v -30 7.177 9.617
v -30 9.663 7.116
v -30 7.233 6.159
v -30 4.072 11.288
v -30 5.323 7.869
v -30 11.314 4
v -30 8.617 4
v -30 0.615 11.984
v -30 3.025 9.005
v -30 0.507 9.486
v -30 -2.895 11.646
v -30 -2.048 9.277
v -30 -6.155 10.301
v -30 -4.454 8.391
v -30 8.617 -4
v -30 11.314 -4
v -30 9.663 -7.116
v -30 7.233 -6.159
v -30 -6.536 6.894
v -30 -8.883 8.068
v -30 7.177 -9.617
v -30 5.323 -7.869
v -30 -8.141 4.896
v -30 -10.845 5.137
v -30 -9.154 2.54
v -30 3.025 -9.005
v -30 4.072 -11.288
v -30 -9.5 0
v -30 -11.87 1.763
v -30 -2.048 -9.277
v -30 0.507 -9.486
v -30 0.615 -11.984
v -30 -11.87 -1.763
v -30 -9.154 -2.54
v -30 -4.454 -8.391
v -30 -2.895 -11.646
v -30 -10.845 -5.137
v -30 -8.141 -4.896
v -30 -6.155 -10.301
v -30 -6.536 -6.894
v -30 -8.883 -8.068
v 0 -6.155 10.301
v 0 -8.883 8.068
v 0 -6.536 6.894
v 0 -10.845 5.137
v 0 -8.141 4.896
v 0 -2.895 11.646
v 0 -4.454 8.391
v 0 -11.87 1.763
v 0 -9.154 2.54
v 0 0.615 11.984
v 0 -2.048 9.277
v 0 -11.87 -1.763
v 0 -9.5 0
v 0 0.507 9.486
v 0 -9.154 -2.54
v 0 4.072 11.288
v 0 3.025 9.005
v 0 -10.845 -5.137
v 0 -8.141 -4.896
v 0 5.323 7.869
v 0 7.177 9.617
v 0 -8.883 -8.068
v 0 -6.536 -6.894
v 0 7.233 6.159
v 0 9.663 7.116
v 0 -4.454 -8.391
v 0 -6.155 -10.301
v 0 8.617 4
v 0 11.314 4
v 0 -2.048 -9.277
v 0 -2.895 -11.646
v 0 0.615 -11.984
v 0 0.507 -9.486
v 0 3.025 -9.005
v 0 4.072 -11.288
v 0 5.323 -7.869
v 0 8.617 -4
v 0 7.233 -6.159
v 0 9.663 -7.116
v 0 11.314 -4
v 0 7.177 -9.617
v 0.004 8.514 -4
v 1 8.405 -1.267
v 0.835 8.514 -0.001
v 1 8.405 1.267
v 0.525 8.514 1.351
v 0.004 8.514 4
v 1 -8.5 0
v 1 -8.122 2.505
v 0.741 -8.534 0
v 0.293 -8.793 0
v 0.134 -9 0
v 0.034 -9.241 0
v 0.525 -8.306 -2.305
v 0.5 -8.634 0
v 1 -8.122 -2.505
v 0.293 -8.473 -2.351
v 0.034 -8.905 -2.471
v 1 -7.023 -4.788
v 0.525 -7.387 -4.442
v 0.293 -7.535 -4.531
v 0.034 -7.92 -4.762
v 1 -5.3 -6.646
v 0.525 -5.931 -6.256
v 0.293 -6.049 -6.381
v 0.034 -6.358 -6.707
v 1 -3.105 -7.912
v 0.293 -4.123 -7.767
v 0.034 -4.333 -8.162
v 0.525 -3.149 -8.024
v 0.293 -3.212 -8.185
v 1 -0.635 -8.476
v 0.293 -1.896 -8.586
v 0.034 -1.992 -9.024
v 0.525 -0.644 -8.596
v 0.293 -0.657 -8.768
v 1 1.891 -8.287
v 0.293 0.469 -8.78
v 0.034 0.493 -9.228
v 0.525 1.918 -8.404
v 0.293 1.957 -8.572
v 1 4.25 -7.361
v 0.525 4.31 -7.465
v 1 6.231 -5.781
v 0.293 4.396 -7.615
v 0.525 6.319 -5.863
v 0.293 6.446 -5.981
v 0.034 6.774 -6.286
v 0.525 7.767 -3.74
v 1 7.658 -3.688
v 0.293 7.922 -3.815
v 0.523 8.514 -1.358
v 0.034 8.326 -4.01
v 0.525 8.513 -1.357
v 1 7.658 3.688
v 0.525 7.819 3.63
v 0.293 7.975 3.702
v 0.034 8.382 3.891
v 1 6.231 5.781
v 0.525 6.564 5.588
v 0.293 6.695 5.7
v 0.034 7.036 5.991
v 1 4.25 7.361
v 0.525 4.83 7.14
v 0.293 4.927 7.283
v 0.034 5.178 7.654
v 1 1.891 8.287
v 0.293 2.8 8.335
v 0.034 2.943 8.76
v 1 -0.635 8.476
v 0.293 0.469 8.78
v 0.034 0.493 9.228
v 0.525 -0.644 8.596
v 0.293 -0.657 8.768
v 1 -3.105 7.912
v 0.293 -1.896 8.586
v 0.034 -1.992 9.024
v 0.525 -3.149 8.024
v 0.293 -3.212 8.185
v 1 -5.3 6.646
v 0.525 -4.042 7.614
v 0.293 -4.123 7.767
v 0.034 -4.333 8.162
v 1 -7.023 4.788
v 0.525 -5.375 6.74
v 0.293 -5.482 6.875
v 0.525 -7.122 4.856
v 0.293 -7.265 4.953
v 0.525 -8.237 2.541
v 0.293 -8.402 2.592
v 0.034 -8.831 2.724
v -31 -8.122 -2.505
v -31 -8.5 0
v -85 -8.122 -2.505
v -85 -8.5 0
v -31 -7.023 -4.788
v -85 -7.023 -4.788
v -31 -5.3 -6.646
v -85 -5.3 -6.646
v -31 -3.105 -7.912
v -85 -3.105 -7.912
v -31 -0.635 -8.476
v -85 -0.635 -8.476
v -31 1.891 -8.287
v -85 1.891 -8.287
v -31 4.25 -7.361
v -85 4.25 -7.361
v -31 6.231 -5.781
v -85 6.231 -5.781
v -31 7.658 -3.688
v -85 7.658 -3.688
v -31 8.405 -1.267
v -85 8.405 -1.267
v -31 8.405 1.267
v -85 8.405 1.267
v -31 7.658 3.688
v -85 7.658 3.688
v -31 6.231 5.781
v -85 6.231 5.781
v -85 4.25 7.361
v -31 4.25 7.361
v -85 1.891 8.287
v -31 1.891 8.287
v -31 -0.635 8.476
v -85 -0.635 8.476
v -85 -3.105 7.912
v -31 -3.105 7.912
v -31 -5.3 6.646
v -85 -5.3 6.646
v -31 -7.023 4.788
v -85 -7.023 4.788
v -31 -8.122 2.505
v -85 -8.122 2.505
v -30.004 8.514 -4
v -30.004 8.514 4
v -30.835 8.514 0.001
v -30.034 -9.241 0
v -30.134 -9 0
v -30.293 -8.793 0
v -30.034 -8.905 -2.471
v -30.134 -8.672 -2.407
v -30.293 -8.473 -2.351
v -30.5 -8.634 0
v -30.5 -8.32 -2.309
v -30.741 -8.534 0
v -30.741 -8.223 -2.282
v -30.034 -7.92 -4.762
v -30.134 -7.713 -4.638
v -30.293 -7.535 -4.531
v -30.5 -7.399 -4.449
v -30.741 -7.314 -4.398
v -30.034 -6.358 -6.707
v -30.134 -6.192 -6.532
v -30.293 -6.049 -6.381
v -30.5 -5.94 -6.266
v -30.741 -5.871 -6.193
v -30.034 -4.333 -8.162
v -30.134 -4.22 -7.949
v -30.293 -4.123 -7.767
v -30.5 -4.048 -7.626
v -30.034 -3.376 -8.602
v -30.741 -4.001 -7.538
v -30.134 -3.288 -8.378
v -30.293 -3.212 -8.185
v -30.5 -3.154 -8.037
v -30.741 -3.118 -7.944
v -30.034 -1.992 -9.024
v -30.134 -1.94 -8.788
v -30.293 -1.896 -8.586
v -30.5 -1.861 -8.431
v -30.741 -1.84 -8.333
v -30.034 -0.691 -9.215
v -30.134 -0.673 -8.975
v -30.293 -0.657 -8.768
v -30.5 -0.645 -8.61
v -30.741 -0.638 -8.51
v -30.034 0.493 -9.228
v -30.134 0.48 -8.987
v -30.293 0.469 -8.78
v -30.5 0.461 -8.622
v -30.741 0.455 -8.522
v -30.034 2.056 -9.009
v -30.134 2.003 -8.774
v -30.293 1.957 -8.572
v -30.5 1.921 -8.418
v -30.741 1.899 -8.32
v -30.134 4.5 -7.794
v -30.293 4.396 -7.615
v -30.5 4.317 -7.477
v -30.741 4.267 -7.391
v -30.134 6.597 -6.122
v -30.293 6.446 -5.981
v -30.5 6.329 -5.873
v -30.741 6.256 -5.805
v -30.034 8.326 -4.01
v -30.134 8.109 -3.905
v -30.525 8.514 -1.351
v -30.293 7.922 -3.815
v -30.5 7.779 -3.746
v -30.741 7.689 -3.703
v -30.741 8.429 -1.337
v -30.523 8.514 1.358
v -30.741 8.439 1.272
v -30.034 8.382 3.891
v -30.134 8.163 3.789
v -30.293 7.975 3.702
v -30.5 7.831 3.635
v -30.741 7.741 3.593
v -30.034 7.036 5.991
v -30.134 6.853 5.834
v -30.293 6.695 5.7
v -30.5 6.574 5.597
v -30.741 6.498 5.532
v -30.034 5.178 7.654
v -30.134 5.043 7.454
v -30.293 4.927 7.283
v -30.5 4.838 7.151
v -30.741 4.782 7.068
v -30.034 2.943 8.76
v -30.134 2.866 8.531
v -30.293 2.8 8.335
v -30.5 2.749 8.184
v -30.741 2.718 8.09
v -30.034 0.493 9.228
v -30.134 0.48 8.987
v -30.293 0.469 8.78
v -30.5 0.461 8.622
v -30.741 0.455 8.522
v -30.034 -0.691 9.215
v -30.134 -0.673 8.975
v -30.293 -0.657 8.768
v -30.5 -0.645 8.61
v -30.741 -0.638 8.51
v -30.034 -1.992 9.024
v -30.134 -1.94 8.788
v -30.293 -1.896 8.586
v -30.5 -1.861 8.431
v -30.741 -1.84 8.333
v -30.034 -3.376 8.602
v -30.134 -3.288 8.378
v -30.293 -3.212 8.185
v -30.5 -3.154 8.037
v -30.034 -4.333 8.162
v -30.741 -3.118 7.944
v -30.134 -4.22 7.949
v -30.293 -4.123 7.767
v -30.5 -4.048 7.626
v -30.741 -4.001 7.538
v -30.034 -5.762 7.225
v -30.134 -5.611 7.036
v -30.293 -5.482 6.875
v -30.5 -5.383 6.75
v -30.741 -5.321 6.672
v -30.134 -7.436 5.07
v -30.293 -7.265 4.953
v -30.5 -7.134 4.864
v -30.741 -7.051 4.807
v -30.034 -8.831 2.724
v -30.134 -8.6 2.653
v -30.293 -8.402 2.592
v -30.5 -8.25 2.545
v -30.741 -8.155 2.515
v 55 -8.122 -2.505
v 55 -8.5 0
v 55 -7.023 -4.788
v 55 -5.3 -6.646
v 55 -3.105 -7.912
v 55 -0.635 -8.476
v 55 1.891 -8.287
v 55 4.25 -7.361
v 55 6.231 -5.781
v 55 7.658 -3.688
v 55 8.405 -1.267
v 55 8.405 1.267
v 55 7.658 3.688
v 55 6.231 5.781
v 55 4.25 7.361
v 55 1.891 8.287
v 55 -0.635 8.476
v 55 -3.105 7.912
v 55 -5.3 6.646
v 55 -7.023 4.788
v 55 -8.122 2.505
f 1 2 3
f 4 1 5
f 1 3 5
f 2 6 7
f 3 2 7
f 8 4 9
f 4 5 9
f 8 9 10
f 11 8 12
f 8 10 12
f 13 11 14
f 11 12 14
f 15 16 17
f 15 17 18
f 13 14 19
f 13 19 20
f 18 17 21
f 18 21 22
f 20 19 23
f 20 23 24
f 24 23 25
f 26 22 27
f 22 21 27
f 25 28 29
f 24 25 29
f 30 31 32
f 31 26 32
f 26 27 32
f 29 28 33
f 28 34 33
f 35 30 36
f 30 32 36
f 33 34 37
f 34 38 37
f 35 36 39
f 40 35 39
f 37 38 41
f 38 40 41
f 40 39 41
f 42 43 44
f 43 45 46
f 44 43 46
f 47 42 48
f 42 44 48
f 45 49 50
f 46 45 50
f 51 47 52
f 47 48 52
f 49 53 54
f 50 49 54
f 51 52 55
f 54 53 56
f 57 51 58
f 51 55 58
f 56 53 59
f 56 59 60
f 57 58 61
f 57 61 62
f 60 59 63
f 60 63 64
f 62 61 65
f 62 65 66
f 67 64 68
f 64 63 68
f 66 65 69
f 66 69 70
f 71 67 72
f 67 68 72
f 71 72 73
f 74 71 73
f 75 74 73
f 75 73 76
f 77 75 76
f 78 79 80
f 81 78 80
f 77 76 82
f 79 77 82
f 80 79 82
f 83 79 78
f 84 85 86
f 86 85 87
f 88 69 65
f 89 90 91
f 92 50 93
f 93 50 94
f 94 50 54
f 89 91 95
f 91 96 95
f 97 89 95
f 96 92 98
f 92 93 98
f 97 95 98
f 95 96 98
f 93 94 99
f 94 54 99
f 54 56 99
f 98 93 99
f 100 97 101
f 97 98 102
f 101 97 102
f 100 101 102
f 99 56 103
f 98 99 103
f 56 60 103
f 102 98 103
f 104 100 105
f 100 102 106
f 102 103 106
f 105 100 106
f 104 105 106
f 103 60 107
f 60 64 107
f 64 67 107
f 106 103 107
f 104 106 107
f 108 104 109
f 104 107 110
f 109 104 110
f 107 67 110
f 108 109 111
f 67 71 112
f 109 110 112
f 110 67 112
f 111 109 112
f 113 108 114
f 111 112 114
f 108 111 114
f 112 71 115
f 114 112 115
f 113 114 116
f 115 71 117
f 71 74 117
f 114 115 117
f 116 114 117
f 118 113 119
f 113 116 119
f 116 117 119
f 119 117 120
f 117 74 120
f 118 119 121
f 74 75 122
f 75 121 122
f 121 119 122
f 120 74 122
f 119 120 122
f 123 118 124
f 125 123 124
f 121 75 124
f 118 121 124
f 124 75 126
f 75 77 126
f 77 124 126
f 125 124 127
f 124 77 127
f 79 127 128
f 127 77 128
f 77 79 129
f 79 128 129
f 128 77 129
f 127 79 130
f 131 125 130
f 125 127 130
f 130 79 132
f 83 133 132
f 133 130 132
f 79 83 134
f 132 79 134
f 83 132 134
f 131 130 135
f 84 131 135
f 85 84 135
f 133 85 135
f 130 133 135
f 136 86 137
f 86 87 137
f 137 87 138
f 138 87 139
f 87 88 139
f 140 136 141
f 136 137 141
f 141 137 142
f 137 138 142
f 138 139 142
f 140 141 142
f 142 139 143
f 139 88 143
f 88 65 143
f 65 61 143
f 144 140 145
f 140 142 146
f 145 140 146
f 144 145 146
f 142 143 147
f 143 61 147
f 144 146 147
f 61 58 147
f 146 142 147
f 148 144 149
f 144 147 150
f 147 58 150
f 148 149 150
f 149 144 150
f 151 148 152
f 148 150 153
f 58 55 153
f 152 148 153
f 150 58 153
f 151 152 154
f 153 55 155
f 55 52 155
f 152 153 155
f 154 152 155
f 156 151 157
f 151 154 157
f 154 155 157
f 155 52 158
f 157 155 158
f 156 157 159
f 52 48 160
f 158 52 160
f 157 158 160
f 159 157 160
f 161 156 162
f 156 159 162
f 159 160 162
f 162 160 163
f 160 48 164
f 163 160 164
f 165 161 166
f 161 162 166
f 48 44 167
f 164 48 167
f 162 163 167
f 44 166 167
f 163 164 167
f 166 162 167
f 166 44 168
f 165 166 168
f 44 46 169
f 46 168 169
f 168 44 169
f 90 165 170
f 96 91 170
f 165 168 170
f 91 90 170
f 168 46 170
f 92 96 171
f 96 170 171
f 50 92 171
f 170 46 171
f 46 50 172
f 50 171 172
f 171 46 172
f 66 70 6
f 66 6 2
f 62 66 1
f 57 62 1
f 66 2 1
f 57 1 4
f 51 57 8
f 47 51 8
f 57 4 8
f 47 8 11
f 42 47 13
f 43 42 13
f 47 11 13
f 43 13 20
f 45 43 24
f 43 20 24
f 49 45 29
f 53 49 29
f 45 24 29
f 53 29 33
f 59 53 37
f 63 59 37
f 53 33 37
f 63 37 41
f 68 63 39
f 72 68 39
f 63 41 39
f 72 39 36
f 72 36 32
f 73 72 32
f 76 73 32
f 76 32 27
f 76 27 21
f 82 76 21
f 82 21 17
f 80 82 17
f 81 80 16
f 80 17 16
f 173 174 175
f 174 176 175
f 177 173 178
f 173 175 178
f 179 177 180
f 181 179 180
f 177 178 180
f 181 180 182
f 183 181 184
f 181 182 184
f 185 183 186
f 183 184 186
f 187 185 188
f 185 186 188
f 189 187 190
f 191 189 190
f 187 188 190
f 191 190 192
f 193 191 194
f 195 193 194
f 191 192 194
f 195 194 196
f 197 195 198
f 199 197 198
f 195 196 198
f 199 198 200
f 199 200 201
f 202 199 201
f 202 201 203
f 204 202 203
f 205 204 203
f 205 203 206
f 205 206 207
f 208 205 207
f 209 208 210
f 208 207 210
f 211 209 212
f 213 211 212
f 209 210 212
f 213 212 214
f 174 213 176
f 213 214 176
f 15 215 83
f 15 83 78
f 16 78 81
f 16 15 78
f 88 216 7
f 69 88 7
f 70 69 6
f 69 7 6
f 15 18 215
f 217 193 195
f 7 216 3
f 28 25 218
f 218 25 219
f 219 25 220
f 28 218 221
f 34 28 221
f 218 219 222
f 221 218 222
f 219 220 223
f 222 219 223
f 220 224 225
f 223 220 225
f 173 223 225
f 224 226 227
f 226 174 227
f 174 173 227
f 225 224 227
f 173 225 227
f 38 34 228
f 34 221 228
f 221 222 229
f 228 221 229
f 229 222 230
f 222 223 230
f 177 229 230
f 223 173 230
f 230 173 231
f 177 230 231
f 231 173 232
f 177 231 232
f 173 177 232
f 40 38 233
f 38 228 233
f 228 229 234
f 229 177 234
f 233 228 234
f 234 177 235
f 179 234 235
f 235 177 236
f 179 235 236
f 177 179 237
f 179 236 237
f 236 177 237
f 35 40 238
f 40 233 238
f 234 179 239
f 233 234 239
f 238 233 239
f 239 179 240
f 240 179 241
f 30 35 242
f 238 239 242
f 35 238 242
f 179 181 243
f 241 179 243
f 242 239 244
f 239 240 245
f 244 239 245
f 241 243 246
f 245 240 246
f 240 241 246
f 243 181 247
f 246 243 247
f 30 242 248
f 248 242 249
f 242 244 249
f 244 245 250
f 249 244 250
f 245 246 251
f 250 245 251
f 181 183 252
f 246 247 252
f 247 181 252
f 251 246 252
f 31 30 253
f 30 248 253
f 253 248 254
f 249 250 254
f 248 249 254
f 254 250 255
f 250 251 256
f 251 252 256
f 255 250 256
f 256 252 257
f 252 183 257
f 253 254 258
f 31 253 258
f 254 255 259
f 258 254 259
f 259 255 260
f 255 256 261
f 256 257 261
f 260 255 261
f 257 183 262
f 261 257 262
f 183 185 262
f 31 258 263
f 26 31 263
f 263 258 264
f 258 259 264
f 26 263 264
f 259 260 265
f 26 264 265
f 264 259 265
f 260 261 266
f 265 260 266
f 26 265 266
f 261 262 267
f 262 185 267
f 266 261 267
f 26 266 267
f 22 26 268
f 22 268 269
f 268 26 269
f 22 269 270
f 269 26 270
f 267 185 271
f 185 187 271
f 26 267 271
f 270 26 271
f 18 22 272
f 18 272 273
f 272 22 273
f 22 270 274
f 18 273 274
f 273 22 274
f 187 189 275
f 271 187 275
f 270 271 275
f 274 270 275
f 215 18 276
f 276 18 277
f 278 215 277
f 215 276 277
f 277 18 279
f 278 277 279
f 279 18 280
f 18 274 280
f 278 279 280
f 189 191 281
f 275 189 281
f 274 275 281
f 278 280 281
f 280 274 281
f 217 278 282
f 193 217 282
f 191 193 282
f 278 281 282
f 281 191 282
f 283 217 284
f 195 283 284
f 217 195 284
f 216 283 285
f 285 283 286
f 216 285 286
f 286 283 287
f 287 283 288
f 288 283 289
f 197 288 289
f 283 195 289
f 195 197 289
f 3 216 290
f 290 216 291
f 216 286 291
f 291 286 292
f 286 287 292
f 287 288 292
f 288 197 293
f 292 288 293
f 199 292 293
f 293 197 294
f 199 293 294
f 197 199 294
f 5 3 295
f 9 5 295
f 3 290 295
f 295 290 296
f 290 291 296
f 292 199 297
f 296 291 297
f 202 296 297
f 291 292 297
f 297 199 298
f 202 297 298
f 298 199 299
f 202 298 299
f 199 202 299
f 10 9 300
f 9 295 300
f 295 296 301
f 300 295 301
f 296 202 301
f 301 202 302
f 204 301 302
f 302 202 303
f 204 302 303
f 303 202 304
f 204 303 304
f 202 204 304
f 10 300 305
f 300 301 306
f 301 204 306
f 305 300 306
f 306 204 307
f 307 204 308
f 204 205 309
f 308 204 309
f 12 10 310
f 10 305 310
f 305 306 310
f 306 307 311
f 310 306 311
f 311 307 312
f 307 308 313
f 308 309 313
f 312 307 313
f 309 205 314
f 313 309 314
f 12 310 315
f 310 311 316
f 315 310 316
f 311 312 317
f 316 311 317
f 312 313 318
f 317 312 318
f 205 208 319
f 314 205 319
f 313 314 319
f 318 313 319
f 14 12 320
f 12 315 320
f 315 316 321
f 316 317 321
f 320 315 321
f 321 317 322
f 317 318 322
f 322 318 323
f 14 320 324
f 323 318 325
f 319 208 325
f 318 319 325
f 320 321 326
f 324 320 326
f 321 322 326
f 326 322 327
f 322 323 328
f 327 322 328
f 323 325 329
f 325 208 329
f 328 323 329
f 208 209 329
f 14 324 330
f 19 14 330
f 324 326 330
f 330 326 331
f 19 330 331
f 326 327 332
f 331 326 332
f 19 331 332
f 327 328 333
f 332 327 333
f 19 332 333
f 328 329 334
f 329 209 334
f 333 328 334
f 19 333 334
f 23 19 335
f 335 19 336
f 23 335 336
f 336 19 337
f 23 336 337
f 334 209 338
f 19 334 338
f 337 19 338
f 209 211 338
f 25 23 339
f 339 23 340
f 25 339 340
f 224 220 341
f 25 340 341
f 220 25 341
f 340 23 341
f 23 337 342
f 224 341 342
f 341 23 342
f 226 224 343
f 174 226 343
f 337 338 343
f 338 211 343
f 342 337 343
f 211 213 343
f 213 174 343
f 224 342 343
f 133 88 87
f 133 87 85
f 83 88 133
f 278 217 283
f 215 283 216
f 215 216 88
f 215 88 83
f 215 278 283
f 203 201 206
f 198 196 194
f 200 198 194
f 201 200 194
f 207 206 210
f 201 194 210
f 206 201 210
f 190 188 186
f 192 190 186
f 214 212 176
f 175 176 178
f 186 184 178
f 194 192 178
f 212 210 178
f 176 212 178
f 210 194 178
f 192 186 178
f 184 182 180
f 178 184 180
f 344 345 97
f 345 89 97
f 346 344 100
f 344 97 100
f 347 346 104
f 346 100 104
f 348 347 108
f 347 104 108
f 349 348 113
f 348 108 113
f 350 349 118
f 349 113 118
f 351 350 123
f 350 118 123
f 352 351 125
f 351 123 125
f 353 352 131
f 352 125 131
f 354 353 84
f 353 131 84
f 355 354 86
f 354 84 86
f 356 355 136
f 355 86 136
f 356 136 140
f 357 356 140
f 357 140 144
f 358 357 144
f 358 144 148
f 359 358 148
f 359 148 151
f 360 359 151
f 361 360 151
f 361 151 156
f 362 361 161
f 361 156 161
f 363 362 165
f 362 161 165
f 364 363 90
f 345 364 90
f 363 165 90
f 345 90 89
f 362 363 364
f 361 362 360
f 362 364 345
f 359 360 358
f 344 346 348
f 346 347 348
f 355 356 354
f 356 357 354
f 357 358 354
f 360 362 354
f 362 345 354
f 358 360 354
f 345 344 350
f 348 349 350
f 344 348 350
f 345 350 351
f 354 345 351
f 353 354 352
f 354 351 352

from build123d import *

# Parameters (mm, degrees)
CUT_EXTRUDE2_DEPTH      = 87.677563418
CUT_EXTRUDE2_DEPTH_BACK = 87.677563418
SKETCH3_W               = 4
SKETCH3_H               = 2.8


with BuildPart() as part:
    # Sketch1 → Revolve1 (revolve)
    with BuildSketch(Plane.XY, mode=Mode.PRIVATE) as revolve1_sk:
        with BuildLine():
            Line((0, 0), (55, 0))
            Line((55, 0), (55, 8.5))
            Line((55, 8.5), (1, 8.5))
            ThreePointArc((1, 8.5), (0.292893219, 8.792893219), (0, 9.5))
            Line((0, 9.5), (0, 12))
            Line((0, 12), (-30, 12))
            Line((-30, 12), (-30, 9.5))
            ThreePointArc((-30, 9.5), (-30.292893219, 8.792893219), (-31, 8.5))
            Line((-31, 8.5), (-85, 8.5))
            Line((-85, 8.5), (-85, 0))
            Line((-85, 0), (0, 0))
        make_face()
    revolve(revolve1_sk.sketch.rotate(Axis((-85, 0, 0), (1, 0, 0)), 180), axis=Axis((-85, 0, 0), (1, 0, 0)))

    # Sketch3 → Cut-Extrude2 (cut, two sides: drawn at the far end of the back side and taken through both)
    with BuildSketch(Plane(origin=(0, 0, 0), x_dir=(0, 0, -1), z_dir=(1, 0, 0)).offset(-CUT_EXTRUDE2_DEPTH_BACK)):
        with Locations((2, 9.913708499)):
            Rectangle(SKETCH3_W, SKETCH3_H)
        with Locations((-2, 9.913708499)):
            Rectangle(SKETCH3_W, SKETCH3_H)
        with BuildLine():
            Line((-4, 11.313708499), (0, 11.313708499))
            Line((0, 11.313708499), (0, 12))
            ThreePointArc((0, 12), (-2.029223745, 11.827182716), (-4, 11.313708499))
        make_face()
        with BuildLine():
            Line((0, 12), (0, 11.313708499))
            Line((0, 11.313708499), (4, 11.313708499))
            ThreePointArc((4, 11.313708499), (2.029223745, 11.827182716), (0, 12))
        make_face()
    extrude(amount=CUT_EXTRUDE2_DEPTH + CUT_EXTRUDE2_DEPTH_BACK, mode=Mode.SUBTRACT)


solid = part.part
